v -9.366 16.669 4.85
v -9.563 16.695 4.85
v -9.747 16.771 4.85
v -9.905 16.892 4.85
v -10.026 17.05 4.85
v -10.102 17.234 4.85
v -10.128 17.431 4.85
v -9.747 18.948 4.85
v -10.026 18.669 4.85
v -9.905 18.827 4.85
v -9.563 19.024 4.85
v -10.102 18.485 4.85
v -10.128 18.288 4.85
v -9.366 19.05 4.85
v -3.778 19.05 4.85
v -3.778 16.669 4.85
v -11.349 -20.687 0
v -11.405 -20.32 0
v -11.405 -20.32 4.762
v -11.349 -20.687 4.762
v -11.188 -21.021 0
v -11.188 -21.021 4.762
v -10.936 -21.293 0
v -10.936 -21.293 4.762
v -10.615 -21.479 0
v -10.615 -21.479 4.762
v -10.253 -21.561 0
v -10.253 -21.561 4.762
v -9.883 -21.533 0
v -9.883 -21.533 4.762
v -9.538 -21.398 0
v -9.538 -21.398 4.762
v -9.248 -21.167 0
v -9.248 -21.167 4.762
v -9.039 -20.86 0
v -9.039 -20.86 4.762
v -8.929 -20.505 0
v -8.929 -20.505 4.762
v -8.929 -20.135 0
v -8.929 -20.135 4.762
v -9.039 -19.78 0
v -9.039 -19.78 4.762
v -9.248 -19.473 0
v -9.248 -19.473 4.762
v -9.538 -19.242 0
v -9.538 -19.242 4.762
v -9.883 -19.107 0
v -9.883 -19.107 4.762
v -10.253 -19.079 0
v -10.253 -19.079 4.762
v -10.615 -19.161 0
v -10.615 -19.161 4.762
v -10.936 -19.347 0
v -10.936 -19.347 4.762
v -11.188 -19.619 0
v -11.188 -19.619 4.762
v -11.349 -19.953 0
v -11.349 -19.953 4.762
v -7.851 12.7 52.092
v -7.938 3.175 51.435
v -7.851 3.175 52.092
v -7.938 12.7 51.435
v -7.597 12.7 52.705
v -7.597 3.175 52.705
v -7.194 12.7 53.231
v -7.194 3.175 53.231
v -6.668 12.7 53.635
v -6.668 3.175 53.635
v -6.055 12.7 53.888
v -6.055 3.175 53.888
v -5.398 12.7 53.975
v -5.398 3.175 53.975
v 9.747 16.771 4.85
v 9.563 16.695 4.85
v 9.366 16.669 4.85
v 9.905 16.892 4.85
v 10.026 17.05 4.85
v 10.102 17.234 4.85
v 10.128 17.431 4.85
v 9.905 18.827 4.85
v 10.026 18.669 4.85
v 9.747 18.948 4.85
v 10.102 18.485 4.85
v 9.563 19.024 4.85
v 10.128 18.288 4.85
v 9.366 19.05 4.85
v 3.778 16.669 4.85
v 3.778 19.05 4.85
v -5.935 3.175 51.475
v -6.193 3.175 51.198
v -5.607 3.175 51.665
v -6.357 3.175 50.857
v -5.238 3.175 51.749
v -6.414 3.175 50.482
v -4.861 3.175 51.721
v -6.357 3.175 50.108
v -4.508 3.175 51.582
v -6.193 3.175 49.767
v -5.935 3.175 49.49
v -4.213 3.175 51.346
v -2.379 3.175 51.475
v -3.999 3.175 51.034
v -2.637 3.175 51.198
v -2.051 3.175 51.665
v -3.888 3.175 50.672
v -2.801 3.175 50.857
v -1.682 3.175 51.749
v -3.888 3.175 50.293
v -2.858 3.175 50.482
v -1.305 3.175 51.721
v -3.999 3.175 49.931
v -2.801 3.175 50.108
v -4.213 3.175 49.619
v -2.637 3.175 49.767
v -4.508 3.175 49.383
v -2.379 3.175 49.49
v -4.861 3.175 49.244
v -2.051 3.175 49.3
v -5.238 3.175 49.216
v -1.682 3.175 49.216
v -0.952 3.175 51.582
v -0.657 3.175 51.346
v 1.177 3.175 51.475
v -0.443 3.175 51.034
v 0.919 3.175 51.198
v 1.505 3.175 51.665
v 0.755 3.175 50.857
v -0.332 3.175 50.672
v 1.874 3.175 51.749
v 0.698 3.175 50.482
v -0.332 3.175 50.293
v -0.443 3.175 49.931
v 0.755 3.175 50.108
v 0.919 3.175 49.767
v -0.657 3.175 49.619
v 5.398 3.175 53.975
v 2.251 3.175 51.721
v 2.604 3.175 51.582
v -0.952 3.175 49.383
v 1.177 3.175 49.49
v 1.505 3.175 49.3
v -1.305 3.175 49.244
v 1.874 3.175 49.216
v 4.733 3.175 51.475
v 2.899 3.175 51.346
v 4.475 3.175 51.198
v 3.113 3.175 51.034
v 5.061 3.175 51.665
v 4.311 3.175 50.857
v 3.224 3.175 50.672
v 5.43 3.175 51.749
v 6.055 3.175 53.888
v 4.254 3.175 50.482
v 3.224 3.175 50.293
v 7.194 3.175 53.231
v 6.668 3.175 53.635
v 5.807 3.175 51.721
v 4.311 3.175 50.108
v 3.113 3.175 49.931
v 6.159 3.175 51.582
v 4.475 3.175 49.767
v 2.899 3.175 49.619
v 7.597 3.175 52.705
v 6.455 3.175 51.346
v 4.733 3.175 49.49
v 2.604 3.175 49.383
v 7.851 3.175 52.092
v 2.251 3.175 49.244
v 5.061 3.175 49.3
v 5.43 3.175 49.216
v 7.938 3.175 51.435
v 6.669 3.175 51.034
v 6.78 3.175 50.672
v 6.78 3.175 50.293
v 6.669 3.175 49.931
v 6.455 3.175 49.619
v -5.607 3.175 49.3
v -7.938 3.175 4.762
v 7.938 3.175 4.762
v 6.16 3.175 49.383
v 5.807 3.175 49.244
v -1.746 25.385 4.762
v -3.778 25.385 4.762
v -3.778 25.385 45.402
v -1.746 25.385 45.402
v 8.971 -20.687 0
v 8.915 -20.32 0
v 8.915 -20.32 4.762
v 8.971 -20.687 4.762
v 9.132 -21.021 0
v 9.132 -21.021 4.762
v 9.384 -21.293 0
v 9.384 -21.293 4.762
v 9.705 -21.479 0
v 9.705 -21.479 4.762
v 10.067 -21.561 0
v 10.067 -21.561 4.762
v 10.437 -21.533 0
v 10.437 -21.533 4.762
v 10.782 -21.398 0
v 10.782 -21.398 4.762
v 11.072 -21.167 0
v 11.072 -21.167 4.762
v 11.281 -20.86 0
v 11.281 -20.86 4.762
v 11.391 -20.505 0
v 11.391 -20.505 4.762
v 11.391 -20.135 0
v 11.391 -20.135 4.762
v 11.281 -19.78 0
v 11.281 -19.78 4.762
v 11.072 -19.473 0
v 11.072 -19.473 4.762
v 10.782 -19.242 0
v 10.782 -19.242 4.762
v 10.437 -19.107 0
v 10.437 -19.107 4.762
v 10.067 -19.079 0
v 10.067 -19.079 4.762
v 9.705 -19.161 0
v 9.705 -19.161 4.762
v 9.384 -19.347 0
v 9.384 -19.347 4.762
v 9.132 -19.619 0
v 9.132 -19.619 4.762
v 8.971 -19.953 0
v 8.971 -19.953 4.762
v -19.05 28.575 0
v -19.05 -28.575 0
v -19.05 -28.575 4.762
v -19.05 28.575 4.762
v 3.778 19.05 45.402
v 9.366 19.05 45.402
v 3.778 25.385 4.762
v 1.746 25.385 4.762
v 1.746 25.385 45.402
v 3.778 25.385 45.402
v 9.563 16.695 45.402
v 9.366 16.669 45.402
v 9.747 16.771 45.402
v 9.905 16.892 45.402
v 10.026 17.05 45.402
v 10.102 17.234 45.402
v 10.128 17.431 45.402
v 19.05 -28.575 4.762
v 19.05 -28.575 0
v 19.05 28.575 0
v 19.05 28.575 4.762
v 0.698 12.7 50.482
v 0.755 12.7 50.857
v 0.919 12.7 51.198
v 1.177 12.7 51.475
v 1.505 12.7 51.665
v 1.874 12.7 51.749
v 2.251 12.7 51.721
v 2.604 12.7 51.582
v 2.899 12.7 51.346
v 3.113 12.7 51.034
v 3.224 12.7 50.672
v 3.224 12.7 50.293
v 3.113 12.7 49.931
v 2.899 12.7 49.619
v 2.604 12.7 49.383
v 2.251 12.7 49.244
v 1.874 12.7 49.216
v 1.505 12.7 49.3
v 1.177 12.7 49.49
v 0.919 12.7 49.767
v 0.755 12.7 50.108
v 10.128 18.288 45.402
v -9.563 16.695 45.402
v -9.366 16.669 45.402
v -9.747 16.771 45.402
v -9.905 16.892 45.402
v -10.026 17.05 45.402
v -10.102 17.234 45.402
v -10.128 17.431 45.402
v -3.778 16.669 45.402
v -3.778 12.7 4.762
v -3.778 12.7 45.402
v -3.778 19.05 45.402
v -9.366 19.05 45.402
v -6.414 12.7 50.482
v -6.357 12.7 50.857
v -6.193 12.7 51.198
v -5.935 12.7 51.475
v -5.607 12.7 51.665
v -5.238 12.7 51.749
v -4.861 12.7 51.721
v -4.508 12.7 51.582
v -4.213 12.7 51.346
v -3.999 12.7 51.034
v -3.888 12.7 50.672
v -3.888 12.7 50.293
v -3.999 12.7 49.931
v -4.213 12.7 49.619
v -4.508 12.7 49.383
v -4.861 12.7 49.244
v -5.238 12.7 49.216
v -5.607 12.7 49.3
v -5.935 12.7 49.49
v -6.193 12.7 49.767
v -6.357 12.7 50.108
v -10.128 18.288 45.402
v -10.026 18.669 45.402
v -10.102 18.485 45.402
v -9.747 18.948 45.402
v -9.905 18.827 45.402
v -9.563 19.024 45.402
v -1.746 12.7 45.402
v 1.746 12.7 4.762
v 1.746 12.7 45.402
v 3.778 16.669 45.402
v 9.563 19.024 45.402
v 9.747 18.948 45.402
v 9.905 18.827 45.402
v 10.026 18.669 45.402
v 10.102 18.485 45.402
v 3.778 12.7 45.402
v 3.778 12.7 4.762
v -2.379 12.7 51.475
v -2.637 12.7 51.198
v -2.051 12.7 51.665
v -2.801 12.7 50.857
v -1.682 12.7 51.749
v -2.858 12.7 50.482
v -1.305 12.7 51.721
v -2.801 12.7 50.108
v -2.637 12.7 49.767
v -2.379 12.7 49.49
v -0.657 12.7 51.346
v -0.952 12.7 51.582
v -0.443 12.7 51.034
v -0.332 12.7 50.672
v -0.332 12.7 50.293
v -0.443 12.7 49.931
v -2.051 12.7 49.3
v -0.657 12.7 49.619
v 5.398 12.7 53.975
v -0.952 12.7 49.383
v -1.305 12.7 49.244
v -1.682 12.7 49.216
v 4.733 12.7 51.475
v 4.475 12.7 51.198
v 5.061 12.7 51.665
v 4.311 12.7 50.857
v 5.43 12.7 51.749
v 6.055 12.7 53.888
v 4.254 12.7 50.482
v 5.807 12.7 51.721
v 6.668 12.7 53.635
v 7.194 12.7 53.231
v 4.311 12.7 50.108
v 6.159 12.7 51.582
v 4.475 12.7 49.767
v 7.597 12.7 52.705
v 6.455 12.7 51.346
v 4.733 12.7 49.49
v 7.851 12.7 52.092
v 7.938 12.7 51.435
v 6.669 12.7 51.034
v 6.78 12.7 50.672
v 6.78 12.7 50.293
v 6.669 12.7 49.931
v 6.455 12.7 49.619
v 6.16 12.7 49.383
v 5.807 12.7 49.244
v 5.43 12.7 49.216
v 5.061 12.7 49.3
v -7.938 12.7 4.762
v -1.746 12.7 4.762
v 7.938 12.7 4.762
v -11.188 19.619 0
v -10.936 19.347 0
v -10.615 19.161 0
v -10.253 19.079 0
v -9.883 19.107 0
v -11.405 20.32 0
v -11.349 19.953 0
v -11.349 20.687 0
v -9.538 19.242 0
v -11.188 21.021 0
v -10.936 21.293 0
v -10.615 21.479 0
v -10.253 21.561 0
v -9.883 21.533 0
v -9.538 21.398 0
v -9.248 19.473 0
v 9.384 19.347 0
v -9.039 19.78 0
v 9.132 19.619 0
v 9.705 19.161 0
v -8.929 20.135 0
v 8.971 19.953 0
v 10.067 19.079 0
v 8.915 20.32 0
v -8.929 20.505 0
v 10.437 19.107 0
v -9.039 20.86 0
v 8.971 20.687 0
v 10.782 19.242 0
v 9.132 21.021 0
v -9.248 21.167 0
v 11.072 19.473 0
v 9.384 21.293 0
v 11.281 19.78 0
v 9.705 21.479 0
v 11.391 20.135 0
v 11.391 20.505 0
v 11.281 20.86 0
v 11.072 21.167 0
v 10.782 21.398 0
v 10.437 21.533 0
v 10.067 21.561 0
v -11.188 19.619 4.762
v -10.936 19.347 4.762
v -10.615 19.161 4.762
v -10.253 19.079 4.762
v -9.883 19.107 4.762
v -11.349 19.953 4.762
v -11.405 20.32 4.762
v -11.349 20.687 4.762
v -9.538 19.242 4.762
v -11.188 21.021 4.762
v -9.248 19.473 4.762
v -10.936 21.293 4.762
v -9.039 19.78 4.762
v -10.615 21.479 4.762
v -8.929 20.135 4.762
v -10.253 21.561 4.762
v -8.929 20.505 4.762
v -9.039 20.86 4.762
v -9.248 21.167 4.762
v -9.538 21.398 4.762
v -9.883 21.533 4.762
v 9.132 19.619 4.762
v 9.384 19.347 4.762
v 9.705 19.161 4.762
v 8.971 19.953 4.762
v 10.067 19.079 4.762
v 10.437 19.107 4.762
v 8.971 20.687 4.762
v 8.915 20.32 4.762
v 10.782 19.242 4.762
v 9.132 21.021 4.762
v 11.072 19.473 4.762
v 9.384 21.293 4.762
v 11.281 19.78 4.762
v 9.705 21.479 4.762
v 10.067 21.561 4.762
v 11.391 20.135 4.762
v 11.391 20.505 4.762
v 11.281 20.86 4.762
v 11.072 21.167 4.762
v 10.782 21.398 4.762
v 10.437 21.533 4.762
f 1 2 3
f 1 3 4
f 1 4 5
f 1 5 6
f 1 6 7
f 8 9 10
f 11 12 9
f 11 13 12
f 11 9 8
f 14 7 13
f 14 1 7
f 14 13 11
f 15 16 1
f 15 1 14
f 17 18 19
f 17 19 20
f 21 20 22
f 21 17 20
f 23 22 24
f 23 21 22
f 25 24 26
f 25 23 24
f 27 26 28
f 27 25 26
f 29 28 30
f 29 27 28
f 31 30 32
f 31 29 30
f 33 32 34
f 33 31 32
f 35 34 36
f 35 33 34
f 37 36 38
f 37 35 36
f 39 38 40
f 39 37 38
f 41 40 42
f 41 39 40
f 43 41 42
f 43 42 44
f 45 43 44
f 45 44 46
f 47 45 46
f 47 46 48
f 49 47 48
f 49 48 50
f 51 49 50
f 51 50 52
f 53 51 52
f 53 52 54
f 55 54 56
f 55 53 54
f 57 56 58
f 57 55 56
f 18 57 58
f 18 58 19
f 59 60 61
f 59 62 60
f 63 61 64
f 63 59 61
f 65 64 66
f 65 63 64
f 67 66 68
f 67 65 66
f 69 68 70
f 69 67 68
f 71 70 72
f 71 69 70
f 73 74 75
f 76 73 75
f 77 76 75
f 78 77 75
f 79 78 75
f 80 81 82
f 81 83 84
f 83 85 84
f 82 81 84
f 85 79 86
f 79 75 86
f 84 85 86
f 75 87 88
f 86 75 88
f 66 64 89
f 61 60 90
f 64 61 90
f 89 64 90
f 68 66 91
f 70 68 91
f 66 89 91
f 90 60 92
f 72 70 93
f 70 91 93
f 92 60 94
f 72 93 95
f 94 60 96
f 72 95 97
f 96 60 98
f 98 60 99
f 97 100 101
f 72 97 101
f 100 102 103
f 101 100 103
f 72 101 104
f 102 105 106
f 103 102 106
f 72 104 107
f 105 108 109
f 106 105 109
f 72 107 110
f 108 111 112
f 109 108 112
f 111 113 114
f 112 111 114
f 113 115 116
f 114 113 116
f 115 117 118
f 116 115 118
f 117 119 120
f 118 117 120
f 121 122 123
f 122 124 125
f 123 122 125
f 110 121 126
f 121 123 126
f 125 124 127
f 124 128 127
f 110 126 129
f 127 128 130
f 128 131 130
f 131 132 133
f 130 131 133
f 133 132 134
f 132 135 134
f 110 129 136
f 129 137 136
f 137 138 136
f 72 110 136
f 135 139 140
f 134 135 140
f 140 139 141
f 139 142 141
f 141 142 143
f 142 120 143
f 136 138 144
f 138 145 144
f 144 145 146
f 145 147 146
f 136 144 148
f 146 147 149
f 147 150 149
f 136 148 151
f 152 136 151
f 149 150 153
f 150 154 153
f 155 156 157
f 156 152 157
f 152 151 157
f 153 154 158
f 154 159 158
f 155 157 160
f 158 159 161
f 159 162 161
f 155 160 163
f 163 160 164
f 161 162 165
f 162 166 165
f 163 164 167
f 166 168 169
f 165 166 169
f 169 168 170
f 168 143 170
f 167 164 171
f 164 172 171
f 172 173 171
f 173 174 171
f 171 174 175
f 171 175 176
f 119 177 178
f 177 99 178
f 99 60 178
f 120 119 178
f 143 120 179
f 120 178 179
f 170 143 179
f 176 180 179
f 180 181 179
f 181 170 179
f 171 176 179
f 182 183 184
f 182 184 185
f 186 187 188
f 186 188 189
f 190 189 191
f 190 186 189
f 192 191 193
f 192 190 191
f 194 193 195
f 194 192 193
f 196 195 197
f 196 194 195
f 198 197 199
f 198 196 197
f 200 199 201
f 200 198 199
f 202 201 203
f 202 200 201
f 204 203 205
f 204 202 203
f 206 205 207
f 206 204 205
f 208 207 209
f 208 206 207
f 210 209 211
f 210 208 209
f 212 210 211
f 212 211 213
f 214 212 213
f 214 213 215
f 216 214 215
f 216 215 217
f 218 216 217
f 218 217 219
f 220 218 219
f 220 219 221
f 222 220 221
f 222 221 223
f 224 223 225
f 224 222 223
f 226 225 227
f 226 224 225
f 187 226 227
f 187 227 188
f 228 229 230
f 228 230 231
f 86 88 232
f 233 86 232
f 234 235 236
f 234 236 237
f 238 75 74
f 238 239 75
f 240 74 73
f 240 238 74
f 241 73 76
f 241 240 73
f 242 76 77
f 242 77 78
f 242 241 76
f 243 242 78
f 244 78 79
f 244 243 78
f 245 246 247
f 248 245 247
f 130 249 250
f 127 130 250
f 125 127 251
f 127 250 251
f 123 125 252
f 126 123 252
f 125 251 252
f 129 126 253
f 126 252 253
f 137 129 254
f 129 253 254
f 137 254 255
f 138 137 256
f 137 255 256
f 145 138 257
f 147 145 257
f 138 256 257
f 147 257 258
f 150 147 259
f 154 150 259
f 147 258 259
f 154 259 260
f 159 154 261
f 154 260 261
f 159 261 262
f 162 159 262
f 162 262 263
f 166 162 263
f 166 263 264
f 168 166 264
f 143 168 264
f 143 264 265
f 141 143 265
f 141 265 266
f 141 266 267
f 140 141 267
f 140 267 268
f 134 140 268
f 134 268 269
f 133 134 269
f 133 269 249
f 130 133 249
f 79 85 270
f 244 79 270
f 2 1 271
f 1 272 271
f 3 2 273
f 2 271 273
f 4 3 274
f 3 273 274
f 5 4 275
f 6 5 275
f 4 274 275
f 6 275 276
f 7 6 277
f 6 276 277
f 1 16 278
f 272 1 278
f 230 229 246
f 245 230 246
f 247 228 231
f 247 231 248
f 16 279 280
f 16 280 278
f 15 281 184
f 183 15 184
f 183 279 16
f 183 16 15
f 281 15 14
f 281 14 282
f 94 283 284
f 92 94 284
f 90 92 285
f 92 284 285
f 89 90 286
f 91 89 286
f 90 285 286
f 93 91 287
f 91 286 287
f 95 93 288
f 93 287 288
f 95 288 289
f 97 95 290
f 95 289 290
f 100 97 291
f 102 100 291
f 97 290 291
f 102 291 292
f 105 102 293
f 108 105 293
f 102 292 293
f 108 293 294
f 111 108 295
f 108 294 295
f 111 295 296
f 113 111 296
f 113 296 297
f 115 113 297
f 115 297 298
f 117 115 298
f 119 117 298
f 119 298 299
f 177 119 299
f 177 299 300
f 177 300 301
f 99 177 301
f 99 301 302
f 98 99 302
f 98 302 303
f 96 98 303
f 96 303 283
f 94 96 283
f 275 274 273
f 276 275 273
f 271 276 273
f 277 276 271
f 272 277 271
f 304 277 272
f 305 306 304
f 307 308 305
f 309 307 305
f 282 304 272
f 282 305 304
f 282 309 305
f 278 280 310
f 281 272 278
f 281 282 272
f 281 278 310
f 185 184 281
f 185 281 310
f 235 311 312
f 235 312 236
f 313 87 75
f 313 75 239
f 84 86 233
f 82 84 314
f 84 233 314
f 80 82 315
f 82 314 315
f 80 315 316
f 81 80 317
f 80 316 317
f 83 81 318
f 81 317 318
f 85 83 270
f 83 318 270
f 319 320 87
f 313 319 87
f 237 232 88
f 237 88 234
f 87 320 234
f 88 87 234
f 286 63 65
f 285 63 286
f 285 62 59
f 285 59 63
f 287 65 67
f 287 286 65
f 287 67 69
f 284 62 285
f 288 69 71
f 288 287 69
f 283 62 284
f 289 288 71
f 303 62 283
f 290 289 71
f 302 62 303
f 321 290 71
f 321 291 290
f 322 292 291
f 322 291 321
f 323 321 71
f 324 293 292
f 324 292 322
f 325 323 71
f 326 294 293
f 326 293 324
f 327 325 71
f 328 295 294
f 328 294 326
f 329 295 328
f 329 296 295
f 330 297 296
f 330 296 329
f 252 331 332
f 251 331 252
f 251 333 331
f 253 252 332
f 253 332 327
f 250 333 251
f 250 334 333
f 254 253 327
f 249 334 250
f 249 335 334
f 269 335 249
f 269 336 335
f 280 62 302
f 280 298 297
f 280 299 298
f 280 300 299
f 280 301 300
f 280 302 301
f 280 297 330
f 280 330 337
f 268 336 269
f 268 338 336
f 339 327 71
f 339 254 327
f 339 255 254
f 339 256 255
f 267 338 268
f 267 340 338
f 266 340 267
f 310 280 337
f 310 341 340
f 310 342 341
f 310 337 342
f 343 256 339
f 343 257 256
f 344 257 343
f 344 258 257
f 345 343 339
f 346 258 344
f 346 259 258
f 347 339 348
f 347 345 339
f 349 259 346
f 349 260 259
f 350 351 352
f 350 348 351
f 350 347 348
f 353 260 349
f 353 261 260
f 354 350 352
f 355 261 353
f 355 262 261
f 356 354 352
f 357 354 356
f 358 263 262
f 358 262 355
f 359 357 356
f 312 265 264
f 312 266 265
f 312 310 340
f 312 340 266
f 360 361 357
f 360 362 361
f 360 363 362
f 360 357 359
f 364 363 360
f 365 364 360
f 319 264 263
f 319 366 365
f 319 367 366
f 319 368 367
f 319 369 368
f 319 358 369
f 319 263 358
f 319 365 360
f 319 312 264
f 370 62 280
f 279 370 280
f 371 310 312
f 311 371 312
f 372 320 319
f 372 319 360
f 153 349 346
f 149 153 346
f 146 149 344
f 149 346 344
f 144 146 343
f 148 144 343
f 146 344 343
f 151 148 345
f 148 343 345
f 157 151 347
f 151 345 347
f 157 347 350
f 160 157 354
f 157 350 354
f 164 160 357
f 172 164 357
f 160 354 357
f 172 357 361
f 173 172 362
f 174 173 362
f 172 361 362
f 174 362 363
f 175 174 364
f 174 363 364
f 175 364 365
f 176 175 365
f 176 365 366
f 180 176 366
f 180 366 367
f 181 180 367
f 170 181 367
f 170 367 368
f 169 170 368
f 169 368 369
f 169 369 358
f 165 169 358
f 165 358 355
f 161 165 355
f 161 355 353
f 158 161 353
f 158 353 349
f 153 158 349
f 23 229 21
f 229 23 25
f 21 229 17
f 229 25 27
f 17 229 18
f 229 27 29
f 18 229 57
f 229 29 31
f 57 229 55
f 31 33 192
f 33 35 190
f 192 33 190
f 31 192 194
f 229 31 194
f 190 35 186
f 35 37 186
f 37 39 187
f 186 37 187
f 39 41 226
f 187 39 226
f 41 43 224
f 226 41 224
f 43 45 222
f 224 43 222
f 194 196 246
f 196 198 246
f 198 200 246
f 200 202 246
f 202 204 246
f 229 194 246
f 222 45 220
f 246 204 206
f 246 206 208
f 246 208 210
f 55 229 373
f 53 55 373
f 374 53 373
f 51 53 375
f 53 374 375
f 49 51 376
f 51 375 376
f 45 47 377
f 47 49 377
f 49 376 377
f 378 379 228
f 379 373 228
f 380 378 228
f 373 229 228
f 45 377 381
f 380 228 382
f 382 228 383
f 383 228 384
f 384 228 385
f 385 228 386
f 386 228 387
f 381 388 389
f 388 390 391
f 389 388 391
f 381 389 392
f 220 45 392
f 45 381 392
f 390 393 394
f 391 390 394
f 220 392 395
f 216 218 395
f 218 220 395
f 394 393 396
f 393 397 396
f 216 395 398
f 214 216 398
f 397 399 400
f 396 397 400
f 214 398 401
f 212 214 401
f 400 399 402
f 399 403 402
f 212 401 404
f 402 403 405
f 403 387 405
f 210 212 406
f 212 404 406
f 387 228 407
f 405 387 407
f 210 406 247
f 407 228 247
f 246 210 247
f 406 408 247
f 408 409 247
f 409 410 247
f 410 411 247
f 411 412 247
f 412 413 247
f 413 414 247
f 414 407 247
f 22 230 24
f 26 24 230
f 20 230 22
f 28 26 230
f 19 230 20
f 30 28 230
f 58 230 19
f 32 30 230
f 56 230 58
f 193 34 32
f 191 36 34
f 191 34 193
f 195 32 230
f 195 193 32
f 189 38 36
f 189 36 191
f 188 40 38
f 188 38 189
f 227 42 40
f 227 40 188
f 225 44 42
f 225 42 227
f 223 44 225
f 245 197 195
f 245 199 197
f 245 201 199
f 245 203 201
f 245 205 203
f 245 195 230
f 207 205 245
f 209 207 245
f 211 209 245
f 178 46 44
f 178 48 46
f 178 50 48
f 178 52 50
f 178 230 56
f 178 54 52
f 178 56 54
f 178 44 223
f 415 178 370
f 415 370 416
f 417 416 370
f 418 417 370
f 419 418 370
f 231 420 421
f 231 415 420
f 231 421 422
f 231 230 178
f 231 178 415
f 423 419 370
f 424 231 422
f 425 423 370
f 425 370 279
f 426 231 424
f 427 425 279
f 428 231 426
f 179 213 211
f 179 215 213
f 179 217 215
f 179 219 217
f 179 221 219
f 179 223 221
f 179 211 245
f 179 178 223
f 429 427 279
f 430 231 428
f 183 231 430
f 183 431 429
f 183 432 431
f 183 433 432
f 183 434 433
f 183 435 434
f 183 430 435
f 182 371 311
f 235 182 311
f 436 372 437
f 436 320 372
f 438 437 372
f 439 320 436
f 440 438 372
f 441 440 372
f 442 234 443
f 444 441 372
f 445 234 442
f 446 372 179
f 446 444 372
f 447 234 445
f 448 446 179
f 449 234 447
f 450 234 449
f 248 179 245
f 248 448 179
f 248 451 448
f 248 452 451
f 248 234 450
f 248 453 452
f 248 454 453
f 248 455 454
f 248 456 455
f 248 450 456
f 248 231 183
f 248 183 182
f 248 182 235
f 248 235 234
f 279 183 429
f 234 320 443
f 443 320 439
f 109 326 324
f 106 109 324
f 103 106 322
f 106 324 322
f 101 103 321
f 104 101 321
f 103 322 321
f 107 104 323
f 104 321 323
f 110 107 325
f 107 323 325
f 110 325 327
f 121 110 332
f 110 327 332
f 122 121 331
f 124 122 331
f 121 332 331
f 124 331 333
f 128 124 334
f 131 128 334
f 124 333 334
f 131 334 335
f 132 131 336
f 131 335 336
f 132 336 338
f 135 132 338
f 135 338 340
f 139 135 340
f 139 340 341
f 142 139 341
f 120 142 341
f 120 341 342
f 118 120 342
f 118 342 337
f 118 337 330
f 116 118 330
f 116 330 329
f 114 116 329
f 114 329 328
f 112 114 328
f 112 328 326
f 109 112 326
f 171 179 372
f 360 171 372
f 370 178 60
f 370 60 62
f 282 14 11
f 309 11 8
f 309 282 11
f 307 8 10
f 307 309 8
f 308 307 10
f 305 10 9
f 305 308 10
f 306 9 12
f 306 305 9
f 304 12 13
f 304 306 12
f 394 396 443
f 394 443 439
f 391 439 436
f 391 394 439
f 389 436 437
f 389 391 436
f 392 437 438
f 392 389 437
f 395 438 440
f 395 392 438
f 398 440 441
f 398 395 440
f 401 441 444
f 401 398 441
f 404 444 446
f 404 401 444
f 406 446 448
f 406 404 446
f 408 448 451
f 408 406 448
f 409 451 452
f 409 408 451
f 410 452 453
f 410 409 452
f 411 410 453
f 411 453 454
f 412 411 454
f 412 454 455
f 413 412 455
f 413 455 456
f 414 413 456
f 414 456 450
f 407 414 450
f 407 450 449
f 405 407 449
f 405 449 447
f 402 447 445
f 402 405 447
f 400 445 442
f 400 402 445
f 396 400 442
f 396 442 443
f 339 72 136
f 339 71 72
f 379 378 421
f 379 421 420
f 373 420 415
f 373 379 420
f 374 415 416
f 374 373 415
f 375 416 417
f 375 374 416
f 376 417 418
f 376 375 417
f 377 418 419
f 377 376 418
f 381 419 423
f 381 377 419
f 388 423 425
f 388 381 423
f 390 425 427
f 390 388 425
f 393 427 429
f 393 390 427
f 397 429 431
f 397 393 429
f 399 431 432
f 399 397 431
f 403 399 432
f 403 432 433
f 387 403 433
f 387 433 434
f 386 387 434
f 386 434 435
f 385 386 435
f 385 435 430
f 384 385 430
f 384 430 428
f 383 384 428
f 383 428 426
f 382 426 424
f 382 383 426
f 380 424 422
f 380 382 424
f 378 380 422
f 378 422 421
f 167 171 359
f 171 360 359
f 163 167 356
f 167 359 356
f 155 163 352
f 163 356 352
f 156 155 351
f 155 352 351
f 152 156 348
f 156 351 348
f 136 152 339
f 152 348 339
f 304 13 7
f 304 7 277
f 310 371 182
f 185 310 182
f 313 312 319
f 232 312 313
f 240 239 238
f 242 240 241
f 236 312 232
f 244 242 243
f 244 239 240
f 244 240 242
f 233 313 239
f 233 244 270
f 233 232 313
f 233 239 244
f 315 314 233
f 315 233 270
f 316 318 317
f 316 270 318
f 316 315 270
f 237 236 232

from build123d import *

# Parameters (mm, degrees)
SKETCH1_W            = 38.1
SKETCH1_H            = 57.15
BOSS_EXTRUDE1_DEPTH  = 4.7625
SKETCH2_R            = 1.2446
CUT_EXTRUDE1_DEPTH   = 4.7625
SKETCH4_W            = 15.875
SKETCH4_H            = 9.525
BOSS_EXTRUDE2_DEPTH  = 49.2125
CUT_EXTRUDE2_REACH   = 72.568
SKETCH5_R            = 1.27
FILLET2_R            = 2.54
SKETCH8_W            = 2.032
SKETCH8_H            = 12.684715198
BOSS_EXTRUDE4_DEPTH  = 40.64
SKETCH9_W            = 40.552264906
SKETCH9_H            = 2.38125
BOSS_EXTRUDE5_DEPTH  = 6.35
FILLET4_R            = 0.762
FILLET4_OF_MIRROR2_R = 0.762


with BuildPart() as part:
    # Sketch1 → Boss-Extrude1 (new body)
    with BuildSketch(Plane.XY):
        Rectangle(SKETCH1_W, SKETCH1_H)
    extrude(amount=BOSS_EXTRUDE1_DEPTH)

    # Sketch2 → Cut-Extrude1 (cut)
    with BuildSketch(Plane.XY):
        with Locations(Location((10.16, 20.32, 0), (0, 0, 180))):
            Circle(SKETCH2_R)
        with Locations(Location((-10.16, 20.32, 0), (0, 0, 180))):
            Circle(SKETCH2_R)
        with Locations(Location((10.16, -20.32, 0), (0, 0, 180))):
            Circle(SKETCH2_R)
        with Locations(Location((-10.16, -20.32, 0), (0, 0, 180))):
            Circle(SKETCH2_R)
    extrude(amount=CUT_EXTRUDE1_DEPTH, mode=Mode.SUBTRACT)

    # Sketch4 → Boss-Extrude2 (add)
    with BuildSketch(Plane.XY.offset(4.7625)):
        with Locations((0, 7.9375)):
            Rectangle(SKETCH4_W, SKETCH4_H)
    extrude(amount=BOSS_EXTRUDE2_DEPTH)

    # Sketch5 → Cut-Extrude2 (cut, up to next)
    with BuildSketch(Plane(origin=(0, 12.7, 0), x_dir=(1, 0, 0), z_dir=(0, 1, 0)), mode=Mode.PRIVATE) as cut_extrude2_sk1:
        with Locations(Location((-5.1435, -50.4825, 0), (0, 0, 180))):
            Circle(SKETCH5_R)
    cut_extrude2_tool1 = extrude(cut_extrude2_sk1.sketch, amount=-CUT_EXTRUDE2_REACH, mode=Mode.PRIVATE) & part.part
    # Sketch5 → Cut-Extrude2 (cut, up to next)
    with BuildSketch(Plane(origin=(0, 12.7, 0), x_dir=(1, 0, 0), z_dir=(0, 1, 0)), mode=Mode.PRIVATE) as cut_extrude2_sk2:
        with Locations(Location((-1.5875, -50.4825, 0), (0, 0, 180))):
            Circle(SKETCH5_R)
    cut_extrude2_tool2 = extrude(cut_extrude2_sk2.sketch, amount=-CUT_EXTRUDE2_REACH, mode=Mode.PRIVATE) & part.part
    # Sketch5 → Cut-Extrude2 (cut, up to next)
    with BuildSketch(Plane(origin=(0, 12.7, 0), x_dir=(1, 0, 0), z_dir=(0, 1, 0)), mode=Mode.PRIVATE) as cut_extrude2_sk3:
        with Locations(Location((1.9685, -50.4825, 0), (0, 0, 180))):
            Circle(SKETCH5_R)
    cut_extrude2_tool3 = extrude(cut_extrude2_sk3.sketch, amount=-CUT_EXTRUDE2_REACH, mode=Mode.PRIVATE) & part.part
    # Sketch5 → Cut-Extrude2 (cut, up to next)
    with BuildSketch(Plane(origin=(0, 12.7, 0), x_dir=(1, 0, 0), z_dir=(0, 1, 0)), mode=Mode.PRIVATE) as cut_extrude2_sk4:
        with Locations(Location((5.5245, -50.4825, 0), (0, 0, 180))):
            Circle(SKETCH5_R)
    cut_extrude2_tool4 = extrude(cut_extrude2_sk4.sketch, amount=-CUT_EXTRUDE2_REACH, mode=Mode.PRIVATE) & part.part
    add(cut_extrude2_tool1.solids().sort_by_distance((-5.1435, 12.7, 50.4825))[0], mode=Mode.SUBTRACT)
    add(cut_extrude2_tool2.solids().sort_by_distance((-1.5875, 12.7, 50.4825))[0], mode=Mode.SUBTRACT)
    add(cut_extrude2_tool3.solids().sort_by_distance((1.9685, 12.7, 50.4825))[0], mode=Mode.SUBTRACT)
    add(cut_extrude2_tool4.solids().sort_by_distance((5.5245, 12.7, 50.4825))[0], mode=Mode.SUBTRACT)

    # Fillet2
    fillet2_edges = [part.edges().sort_by_distance(p)[0] for p in [
        (-7.9375, 7.9375, 53.975),
        (7.9375, 7.9375, 53.975),
    ]]
    fillet(fillet2_edges, radius=FILLET2_R)

    # Sketch8 → Boss-Extrude4 (add)
    with BuildSketch(Plane.XY.offset(4.7625)):
        with Locations((-2.76225, 19.042357599)):
            Rectangle(SKETCH8_W, SKETCH8_H)
        with Locations((2.76225, 19.042357599)):
            Rectangle(SKETCH8_W, SKETCH8_H)
    extrude(amount=BOSS_EXTRUDE4_DEPTH)

    # Sketch9 → Boss-Extrude5 (add)
    with BuildSketch(Plane.ZY.offset(3.77825)):
        with Locations((25.126367547, 17.859375)):
            Rectangle(SKETCH9_W, SKETCH9_H)
    boss_extrude5 = extrude(amount=BOSS_EXTRUDE5_DEPTH)

    # Fillet4
    fillet4_edges = [part.edges().sort_by_distance(p)[0] for p in [
        (-10.12825, 19.05, 25.126367547),
        (-10.12825, 16.66875, 25.126367547),
    ]]
    fillet(fillet4_edges, radius=FILLET4_R)

    # Mirror2: Boss-Extrude5 across plane
    add(boss_extrude5.mirror(Plane.ZY))

    # Fillet4 of Mirror2
    fillet4_of_mirror2_edges = [part.edges().sort_by_distance(p)[0] for p in [
        (10.12825, 19.05, 25.126367547),
        (10.12825, 16.66875, 25.126367547),
    ]]
    fillet(fillet4_of_mirror2_edges, radius=FILLET4_OF_MIRROR2_R)


solid = part.part
